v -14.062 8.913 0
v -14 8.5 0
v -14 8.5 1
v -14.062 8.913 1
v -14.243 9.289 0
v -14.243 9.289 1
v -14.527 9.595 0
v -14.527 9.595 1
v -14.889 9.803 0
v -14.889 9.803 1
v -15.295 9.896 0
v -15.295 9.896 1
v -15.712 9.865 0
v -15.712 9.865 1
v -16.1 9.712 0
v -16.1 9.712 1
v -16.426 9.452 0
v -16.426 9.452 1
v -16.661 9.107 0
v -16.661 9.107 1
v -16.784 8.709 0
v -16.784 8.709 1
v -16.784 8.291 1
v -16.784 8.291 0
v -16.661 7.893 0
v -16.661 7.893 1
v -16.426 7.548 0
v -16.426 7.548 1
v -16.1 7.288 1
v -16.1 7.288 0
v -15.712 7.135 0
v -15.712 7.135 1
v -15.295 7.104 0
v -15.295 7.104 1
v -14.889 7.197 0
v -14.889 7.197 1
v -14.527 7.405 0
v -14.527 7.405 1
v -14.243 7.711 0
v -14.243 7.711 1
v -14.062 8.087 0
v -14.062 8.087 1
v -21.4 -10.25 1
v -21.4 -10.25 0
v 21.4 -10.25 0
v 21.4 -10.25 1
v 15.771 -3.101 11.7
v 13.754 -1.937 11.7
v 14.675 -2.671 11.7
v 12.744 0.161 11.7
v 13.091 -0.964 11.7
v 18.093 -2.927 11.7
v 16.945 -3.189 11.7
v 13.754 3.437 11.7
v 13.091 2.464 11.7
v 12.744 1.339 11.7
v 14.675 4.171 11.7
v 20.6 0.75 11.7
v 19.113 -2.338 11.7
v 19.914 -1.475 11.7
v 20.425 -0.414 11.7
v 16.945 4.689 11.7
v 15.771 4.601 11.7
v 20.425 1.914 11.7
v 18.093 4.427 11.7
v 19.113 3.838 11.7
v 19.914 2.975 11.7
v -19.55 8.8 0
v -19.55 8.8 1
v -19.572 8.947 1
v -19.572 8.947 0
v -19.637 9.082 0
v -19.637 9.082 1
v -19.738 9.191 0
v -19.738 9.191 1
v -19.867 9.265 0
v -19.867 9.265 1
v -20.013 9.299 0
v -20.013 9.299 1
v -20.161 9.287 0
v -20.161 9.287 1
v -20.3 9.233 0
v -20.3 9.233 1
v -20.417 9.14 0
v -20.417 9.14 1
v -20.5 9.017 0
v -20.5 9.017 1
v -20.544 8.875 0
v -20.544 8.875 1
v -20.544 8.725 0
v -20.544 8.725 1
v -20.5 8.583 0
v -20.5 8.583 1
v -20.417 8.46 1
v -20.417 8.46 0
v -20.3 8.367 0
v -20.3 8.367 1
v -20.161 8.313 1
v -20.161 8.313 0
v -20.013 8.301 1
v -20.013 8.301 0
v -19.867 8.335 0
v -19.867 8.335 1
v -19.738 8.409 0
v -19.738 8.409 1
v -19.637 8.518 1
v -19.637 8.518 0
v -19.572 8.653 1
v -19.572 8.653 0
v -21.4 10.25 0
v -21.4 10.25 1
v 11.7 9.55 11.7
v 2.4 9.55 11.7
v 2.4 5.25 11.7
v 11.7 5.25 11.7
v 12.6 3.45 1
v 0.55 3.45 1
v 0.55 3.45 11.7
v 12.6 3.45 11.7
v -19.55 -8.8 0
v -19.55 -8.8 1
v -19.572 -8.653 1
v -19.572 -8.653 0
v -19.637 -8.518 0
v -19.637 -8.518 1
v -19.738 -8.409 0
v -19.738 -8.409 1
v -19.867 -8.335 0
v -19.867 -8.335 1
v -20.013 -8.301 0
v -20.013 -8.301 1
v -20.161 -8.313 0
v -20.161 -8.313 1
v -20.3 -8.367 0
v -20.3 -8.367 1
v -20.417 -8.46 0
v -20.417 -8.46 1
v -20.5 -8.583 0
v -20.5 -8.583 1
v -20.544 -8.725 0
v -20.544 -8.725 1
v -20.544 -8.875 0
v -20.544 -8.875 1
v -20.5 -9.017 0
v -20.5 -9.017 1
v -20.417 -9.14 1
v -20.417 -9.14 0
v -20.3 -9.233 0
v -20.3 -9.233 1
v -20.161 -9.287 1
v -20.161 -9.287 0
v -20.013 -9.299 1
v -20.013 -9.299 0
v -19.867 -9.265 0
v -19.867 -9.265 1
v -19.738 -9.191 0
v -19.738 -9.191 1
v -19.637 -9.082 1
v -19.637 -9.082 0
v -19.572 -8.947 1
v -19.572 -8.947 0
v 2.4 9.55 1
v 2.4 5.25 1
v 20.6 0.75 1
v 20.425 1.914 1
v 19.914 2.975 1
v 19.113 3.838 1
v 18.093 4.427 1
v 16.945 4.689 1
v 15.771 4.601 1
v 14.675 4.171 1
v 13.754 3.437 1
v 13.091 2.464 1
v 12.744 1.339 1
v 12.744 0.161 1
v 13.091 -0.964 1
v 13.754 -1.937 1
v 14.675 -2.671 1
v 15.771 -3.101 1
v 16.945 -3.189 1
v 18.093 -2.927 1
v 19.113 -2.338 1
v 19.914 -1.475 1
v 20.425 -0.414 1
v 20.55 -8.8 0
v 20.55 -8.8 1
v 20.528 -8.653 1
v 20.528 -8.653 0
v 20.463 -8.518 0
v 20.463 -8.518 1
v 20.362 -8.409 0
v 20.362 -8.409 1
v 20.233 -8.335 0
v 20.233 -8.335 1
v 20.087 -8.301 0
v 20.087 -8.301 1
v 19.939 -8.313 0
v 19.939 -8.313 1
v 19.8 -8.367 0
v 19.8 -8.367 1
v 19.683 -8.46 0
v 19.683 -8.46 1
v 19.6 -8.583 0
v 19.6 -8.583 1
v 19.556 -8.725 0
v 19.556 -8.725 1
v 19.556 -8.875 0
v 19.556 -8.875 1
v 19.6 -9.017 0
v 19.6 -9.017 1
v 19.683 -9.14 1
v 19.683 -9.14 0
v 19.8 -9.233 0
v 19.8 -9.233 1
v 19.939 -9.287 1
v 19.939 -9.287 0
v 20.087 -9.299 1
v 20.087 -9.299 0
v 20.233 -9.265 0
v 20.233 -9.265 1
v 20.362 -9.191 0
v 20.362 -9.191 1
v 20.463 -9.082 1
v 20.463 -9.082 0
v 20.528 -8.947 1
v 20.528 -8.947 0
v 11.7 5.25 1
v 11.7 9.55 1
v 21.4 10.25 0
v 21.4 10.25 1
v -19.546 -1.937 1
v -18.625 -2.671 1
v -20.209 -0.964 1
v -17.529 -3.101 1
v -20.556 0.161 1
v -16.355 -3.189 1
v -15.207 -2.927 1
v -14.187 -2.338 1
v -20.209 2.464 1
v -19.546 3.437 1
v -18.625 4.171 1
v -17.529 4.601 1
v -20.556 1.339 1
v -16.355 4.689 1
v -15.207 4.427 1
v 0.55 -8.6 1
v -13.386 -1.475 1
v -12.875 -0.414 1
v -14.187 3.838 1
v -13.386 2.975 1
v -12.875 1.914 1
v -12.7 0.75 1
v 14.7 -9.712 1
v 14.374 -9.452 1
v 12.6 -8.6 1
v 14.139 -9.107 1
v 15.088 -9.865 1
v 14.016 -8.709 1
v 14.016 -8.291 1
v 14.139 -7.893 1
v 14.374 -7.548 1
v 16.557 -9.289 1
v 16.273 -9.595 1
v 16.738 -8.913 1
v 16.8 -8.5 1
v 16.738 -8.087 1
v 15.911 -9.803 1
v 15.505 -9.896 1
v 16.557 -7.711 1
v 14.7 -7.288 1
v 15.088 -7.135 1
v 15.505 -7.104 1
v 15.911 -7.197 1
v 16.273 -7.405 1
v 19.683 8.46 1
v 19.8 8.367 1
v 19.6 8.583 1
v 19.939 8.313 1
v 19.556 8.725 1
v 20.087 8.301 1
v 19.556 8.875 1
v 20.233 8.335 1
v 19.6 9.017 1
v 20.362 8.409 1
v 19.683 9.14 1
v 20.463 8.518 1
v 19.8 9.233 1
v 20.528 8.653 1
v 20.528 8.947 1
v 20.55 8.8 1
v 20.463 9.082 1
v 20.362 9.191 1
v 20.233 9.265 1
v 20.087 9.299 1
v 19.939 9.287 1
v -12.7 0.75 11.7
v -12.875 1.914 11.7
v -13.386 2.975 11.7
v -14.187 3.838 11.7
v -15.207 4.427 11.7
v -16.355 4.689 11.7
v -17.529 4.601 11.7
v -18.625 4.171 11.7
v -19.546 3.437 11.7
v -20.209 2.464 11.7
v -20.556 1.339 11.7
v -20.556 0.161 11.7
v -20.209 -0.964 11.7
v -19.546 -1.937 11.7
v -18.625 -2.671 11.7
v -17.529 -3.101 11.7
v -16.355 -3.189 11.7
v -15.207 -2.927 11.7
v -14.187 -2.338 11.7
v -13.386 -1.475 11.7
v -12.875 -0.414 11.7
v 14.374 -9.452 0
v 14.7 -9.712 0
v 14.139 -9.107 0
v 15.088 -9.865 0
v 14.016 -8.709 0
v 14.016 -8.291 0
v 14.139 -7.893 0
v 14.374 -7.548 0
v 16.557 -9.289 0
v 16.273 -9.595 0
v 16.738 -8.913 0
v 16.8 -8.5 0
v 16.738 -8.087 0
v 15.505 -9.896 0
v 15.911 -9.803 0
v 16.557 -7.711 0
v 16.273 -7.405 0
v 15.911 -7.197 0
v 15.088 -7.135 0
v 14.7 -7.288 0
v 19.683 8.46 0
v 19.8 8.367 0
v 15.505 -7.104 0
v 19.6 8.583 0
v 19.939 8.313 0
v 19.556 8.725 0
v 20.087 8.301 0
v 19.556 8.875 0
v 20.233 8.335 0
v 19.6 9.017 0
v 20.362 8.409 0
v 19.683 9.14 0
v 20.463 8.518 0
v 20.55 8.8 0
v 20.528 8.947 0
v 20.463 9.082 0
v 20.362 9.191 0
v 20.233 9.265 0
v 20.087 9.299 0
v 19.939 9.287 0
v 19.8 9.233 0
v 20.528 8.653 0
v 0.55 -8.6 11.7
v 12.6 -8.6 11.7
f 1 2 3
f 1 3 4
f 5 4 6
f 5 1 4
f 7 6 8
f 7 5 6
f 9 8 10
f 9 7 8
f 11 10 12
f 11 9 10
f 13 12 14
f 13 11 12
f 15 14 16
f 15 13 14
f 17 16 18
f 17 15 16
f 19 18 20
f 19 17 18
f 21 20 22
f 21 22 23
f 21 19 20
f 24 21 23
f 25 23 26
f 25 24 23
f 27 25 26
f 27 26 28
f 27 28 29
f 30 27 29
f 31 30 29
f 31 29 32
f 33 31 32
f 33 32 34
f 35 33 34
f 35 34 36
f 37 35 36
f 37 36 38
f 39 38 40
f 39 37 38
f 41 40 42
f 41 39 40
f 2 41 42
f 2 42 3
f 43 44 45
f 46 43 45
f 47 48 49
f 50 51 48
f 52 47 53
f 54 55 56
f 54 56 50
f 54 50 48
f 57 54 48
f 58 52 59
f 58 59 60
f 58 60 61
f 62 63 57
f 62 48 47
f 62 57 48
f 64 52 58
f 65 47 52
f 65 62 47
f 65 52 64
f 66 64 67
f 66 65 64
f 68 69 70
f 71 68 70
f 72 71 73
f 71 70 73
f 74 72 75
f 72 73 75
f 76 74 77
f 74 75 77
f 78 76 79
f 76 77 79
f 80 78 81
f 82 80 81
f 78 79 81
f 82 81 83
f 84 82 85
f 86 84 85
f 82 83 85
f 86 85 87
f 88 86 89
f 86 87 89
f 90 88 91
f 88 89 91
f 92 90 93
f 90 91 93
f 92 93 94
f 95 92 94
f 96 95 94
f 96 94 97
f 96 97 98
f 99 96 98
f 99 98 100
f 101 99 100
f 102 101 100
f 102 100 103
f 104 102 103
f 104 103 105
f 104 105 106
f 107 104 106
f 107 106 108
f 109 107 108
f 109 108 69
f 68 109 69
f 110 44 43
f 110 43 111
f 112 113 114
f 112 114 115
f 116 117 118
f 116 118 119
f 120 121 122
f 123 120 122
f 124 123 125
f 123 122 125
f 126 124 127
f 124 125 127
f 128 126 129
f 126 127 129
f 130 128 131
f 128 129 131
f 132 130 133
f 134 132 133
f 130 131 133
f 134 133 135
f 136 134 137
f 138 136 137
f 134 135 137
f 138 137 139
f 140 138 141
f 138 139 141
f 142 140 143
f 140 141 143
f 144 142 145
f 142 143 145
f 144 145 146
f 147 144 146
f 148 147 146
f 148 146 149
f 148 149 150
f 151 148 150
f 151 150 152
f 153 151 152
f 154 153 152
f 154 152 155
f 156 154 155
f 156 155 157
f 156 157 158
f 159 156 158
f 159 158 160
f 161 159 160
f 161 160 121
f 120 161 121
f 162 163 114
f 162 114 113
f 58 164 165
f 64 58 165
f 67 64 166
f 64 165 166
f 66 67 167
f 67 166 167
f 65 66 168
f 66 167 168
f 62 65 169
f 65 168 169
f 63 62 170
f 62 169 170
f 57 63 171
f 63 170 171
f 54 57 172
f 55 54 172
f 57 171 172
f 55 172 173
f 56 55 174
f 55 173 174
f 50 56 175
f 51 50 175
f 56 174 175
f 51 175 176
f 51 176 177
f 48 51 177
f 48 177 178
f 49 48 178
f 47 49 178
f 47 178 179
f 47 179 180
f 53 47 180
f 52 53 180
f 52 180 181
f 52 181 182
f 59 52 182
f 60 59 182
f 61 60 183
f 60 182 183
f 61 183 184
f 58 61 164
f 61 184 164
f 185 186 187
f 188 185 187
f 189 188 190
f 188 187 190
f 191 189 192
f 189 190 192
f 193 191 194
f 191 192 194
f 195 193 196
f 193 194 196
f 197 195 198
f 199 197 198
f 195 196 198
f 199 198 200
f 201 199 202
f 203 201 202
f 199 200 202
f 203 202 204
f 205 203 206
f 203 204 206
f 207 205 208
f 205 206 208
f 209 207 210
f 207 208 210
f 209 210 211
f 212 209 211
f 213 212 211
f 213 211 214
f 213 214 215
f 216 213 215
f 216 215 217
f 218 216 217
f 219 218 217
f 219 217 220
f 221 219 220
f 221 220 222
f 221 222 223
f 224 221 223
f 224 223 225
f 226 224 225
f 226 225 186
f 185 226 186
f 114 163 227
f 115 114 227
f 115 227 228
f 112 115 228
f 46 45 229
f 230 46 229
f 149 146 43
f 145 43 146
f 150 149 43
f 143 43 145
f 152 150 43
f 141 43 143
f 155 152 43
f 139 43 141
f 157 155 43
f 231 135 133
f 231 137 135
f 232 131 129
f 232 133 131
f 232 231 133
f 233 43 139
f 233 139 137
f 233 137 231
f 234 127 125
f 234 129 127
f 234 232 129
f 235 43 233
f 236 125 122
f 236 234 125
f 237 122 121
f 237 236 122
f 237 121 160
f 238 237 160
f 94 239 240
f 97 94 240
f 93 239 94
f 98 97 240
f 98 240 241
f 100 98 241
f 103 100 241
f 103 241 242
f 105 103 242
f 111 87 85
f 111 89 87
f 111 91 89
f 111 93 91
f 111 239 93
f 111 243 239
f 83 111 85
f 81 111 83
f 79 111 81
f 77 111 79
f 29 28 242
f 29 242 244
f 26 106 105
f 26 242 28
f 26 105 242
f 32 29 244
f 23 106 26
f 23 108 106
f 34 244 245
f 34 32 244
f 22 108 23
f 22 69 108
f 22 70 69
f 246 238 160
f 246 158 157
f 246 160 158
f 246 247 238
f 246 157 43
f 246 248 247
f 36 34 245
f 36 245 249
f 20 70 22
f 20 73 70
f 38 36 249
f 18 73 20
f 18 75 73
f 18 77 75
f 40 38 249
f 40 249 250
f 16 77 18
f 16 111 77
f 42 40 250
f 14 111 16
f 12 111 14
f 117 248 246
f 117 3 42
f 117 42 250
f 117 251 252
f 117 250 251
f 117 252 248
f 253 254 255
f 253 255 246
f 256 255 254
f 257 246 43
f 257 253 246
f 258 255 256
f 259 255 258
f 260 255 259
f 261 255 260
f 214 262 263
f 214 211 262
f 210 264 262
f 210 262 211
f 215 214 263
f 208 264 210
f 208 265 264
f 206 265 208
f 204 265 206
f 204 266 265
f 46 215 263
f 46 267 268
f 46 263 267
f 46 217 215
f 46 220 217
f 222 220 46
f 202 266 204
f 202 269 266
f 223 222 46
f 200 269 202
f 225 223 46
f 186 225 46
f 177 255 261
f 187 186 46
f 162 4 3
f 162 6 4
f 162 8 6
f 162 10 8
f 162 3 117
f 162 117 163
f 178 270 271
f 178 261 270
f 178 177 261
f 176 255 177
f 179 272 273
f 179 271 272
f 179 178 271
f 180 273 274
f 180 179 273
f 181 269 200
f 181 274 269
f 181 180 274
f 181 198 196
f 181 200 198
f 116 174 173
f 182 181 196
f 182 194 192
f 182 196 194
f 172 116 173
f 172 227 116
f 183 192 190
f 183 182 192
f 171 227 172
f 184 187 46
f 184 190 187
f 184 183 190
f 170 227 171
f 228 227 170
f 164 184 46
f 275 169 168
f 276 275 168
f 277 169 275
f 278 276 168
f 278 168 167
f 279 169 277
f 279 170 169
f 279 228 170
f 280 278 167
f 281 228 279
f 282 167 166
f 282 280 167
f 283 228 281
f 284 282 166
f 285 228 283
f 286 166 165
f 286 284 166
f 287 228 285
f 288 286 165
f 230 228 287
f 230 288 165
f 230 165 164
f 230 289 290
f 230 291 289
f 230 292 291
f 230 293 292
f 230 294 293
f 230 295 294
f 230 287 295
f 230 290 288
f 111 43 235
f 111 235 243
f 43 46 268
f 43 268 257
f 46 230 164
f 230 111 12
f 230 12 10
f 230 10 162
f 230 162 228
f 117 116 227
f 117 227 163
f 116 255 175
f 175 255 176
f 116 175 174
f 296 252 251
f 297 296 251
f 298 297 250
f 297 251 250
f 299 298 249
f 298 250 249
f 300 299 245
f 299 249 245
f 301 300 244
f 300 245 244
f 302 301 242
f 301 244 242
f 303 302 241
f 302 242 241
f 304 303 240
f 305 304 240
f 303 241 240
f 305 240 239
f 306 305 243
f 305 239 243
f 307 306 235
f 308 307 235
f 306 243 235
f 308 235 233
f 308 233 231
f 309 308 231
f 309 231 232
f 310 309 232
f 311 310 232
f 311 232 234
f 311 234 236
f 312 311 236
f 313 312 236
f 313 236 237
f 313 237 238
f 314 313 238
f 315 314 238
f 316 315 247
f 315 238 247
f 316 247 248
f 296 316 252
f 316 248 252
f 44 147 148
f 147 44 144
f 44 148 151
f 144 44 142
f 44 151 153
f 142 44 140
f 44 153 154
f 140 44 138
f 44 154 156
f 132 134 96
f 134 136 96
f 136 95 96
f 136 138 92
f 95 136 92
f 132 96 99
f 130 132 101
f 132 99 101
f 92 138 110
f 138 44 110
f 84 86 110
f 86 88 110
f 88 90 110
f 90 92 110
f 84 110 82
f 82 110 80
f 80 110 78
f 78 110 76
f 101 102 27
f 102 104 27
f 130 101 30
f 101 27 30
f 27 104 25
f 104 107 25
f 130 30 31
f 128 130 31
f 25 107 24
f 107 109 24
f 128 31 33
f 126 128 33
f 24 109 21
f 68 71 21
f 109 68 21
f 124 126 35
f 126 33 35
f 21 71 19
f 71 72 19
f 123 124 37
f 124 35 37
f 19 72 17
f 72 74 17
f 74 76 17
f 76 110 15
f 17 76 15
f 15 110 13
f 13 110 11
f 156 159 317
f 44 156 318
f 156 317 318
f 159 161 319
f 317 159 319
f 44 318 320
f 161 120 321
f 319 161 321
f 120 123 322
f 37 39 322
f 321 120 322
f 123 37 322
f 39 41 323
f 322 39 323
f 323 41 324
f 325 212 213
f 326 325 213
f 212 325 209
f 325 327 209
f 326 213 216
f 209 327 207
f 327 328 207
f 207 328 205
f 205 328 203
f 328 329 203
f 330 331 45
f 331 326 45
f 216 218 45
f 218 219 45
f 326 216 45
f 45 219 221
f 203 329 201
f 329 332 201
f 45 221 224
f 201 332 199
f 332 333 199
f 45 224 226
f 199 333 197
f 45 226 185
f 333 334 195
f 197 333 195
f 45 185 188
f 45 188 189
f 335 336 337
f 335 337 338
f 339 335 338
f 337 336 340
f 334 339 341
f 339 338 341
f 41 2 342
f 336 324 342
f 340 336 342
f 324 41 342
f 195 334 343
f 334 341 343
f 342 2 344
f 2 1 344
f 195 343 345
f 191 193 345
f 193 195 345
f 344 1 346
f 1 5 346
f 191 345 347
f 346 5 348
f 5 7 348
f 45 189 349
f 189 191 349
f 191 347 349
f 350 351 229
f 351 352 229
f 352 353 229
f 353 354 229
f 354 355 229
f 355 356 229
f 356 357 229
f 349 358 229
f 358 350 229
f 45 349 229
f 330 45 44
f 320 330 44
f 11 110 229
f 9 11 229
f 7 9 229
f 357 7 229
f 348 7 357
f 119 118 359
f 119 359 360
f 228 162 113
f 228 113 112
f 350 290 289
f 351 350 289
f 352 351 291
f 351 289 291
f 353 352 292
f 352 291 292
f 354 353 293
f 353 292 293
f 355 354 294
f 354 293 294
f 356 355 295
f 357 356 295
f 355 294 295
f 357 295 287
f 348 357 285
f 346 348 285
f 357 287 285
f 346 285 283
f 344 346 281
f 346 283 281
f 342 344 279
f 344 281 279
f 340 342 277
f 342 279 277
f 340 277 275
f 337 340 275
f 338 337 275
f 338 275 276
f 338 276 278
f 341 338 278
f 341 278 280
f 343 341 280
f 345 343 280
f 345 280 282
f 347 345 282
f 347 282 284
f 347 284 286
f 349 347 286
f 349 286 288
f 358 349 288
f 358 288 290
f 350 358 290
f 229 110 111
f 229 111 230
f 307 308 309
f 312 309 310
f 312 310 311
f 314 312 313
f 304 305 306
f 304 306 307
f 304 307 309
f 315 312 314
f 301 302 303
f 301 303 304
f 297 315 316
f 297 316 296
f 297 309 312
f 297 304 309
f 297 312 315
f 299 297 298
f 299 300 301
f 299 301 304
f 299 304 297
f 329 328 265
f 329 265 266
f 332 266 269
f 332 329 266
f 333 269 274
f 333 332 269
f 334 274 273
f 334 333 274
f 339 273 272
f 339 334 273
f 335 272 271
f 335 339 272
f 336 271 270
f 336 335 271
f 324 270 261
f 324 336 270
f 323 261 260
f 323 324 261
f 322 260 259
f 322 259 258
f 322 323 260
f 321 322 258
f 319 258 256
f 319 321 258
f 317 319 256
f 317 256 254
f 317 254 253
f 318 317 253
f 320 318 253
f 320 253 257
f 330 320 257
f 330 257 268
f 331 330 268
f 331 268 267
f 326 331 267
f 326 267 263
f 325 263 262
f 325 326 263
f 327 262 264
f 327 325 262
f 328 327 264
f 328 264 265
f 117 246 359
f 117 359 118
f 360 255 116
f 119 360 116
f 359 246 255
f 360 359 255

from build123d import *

# Parameters (mm, degrees)
SKETCH1_W           = 42.8
SKETCH1_H           = 20.5
SKETCH1_R           = 1.4
BOSS_EXTRUDE1_DEPTH = 1
SKETCH3_R           = 3.95
SKETCH3_W           = 9.3
SKETCH3_H           = 4.3
SKETCH3_W_2         = 12.05
SKETCH3_H_2         = 12.05
BOSS_EXTRUDE2_DEPTH = 10.7
SKETCH4_R           = 0.5
CUT_EXTRUDE1_DEPTH  = 2


with BuildPart() as part:
    # Sketch1 → Boss-Extrude1 (new body)
    with BuildSketch(Plane.XY):
        Rectangle(SKETCH1_W, SKETCH1_H)
        with Locations((15.4, -8.5)):
            Circle(SKETCH1_R, mode=Mode.SUBTRACT)
        with Locations((-15.4, 8.5)):
            Circle(SKETCH1_R, mode=Mode.SUBTRACT)
    extrude(amount=BOSS_EXTRUDE1_DEPTH)

    # Sketch3 → Boss-Extrude2 (add)
    with BuildSketch(Plane.XY.offset(1)):
        with Locations((16.65, 0.75)):
            Circle(SKETCH3_R)
        with Locations((-16.65, 0.75)):
            Circle(SKETCH3_R)
        with Locations((7.05, 7.4)):
            Rectangle(SKETCH3_W, SKETCH3_H)
        with Locations((6.575, -2.575)):
            Rectangle(SKETCH3_W_2, SKETCH3_H_2)
    extrude(amount=BOSS_EXTRUDE2_DEPTH)

    # Sketch4 → Cut-Extrude1 (cut, through all)
    with BuildSketch(Plane.XY.offset(1)):
        with Locations((-20.05, 8.8)):
            Circle(SKETCH4_R)
        with Locations((-20.05, -8.8)):
            Circle(SKETCH4_R)
        with Locations((20.05, -8.8)):
            Circle(SKETCH4_R)
        with Locations((20.05, 8.8)):
            Circle(SKETCH4_R)
    extrude(amount=-CUT_EXTRUDE1_DEPTH, mode=Mode.SUBTRACT)


solid = part.part
